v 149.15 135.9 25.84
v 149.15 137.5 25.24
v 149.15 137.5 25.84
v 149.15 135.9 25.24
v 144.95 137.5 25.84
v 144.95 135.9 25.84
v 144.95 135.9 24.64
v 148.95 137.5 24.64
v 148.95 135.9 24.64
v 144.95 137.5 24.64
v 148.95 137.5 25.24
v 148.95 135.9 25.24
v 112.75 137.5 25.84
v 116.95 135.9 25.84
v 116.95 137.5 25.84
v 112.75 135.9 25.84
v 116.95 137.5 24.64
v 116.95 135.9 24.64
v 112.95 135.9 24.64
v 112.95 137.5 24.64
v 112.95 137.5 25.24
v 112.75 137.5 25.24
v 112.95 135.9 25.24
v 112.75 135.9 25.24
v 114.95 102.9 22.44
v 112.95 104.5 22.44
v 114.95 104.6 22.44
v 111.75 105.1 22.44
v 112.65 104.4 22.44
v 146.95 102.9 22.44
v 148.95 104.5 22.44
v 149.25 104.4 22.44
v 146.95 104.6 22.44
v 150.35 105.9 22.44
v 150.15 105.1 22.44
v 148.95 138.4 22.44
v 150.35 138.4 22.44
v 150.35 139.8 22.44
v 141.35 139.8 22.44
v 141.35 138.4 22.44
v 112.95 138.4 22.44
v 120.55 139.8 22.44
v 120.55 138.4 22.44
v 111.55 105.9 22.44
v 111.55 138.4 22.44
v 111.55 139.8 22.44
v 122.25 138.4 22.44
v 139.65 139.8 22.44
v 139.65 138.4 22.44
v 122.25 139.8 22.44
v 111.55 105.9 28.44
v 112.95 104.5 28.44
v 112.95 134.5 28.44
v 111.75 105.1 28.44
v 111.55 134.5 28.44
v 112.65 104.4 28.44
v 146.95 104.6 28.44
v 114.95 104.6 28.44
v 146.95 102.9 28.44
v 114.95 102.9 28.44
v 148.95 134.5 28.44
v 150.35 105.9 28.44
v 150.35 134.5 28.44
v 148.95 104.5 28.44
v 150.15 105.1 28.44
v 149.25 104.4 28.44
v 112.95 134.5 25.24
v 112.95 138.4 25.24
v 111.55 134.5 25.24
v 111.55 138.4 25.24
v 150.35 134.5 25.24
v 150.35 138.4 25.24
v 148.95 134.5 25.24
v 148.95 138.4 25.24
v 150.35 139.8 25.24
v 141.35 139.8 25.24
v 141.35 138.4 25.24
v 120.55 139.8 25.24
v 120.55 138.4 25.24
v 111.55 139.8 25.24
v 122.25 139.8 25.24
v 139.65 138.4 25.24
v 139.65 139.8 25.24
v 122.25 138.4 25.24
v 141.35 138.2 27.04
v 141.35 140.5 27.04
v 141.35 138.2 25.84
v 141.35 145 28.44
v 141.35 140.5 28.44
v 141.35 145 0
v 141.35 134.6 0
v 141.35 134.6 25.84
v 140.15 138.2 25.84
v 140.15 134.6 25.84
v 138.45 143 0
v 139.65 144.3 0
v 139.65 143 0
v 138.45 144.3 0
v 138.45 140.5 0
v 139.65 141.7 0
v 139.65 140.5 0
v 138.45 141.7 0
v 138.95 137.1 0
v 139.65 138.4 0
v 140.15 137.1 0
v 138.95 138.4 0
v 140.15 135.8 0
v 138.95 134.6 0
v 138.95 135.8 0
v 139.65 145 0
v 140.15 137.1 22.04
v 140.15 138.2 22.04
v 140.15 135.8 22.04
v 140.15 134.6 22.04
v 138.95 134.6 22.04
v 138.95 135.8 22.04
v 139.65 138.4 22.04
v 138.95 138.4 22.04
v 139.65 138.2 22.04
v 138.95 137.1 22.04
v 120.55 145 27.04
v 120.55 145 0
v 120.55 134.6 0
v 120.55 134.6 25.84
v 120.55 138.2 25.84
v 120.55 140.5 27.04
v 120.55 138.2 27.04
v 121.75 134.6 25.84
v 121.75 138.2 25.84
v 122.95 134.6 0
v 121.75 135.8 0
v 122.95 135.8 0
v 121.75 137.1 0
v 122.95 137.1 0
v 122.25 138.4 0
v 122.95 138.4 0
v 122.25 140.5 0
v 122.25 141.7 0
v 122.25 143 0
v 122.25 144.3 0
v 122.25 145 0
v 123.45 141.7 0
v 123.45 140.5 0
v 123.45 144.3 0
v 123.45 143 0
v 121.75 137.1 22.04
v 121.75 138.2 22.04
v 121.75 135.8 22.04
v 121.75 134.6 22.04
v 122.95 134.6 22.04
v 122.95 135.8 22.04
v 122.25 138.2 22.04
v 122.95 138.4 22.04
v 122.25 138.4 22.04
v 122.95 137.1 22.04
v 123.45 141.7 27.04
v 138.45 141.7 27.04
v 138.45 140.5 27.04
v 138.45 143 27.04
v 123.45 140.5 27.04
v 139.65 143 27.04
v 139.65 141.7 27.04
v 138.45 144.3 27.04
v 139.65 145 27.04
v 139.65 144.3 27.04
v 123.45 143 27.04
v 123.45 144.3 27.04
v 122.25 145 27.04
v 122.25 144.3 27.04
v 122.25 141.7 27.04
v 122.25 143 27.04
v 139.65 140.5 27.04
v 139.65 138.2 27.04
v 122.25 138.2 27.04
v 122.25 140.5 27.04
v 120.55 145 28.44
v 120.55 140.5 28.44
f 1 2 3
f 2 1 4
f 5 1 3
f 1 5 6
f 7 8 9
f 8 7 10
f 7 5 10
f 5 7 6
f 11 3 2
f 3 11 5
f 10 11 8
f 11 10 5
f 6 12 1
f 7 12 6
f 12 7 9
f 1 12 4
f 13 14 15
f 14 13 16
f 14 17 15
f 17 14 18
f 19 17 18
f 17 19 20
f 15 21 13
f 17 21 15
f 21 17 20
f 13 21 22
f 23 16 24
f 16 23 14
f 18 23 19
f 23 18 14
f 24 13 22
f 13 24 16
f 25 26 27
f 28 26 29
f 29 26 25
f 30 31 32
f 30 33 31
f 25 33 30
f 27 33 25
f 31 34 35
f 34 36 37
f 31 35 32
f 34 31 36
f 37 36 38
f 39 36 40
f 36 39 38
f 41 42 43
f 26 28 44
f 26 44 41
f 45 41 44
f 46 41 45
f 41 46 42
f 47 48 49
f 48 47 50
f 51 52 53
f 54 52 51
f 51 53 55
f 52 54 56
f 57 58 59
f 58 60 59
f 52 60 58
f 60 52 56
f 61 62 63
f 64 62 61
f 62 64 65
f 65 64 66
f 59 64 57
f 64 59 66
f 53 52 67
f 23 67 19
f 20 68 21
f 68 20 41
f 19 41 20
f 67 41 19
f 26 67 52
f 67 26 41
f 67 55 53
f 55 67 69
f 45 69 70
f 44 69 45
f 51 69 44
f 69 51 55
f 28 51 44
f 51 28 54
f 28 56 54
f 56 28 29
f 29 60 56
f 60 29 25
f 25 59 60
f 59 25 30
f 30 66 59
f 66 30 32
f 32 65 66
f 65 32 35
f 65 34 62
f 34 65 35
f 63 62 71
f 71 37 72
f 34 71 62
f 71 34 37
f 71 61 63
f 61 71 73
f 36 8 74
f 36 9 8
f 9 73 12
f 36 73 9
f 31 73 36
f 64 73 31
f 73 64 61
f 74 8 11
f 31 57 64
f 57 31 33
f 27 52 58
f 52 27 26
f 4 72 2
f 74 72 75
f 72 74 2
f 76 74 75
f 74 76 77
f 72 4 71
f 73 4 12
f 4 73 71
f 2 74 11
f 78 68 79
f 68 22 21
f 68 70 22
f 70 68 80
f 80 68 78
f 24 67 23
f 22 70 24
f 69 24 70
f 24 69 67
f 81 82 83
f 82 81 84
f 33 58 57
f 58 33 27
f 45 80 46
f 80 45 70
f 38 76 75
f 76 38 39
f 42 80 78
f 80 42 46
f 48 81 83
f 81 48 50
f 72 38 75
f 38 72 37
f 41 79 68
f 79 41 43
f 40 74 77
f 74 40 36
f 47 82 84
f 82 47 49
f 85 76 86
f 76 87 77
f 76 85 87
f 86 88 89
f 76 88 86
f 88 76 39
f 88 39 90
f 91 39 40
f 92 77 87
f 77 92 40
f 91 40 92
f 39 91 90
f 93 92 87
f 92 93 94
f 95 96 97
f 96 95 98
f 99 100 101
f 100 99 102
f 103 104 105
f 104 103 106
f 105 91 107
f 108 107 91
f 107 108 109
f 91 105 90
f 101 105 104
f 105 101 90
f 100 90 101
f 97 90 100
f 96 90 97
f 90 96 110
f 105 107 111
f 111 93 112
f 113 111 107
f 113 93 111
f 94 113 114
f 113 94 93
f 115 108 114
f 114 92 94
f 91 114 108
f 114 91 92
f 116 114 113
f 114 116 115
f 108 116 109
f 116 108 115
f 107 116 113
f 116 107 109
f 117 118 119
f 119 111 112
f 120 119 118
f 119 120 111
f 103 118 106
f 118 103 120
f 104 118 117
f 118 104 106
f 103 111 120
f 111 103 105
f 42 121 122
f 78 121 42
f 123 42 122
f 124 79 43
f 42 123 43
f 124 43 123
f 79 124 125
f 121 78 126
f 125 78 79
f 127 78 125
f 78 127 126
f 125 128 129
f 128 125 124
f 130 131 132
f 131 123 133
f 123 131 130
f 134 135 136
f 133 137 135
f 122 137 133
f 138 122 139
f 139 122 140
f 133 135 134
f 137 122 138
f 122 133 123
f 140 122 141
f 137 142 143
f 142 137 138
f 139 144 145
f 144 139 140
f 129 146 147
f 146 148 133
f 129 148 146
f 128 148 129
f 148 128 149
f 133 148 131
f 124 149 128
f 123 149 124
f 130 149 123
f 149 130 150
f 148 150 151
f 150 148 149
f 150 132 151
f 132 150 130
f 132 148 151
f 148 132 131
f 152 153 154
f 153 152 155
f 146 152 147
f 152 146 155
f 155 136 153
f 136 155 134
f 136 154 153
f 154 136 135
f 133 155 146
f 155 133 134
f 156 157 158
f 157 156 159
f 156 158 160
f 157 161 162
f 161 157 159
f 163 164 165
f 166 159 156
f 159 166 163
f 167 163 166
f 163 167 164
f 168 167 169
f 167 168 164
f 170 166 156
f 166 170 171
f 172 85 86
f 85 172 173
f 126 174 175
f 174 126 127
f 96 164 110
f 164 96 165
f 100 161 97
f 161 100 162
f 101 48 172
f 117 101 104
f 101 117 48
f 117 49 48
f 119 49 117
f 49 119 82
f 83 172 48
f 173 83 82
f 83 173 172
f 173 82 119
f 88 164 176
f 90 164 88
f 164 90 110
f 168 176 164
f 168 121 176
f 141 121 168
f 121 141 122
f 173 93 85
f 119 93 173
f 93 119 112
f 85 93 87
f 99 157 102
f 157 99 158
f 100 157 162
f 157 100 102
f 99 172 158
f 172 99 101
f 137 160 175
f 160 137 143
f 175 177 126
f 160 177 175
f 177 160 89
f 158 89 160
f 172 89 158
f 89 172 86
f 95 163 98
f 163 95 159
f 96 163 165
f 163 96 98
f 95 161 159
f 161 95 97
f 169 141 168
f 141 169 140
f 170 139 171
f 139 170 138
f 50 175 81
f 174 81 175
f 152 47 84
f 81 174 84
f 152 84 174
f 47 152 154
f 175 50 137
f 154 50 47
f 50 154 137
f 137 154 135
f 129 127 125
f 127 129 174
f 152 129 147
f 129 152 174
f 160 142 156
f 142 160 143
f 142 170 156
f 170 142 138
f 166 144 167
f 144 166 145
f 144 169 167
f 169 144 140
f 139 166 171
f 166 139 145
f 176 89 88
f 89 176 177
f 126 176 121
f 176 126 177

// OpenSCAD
// Deck Buddy SIMPLE INSERT (Elephant style) - TEST. Body frame: x centre 130.95, y = 87.5 + height from table, z = 40.64 - depth from front (z=0 = back opening).
// view = "insert" | "asm" | "clash" | "print"
view = "insert";
BODY = "../reference/original/obj_7_corp+face.stl_1.stl";
XC = 130.95; Y0 = 87.5; ZF = 40.64; e = 0.01;
module blk(x0,x1,h0,h1,d0,d1) translate([XC+x0, Y0+h0, ZF-d1]) cube([x1-x0, h1-h0, d1-d0]);
module mir(f=[1,0,0]) { children(); translate([2*XC,0,0]) mirror([1,0,0]) translate([-0,0,0]) children(); }
module sym() { children(); translate([XC,0,0]) mirror([1,0,0]) translate([-XC,0,0]) children(); }   // mirror about x = XC
// ---- OLED bay (plain, open top and back): PCB 35.4 x 33.5 x 1.2 at d 13.5..14.7, h 17.1..50.6 ----
module ext(d0,d1) translate([XC,Y0,ZF-d1]) linear_extrude(d1-d0) children();
module r2(x0,x1,h0,h1) translate([x0,h0]) square([x1-x0,h1-h0]);
module bay() {
  // lower part follows the bowl of the body (free half width only 16.4 at h15, 18.4 at h17): bottom bar + web, side walls from h18.4
  ext(12.2,18.2) for (s=[1,-1]) scale([s,1]) {
     polygon([[0,15.4],[16,15.4],[18.3,16.9],[19.2,17.6],[19.4,18.4],[18.0,18.4],[18.0,17.0],[16,17.1],[0,17.1]]);
     r2(18.0,19.4,18.4,47.0);
  }
  ext(15.4,18.2) for (s=[1,-1]) scale([s,1]) r2(18.0,19.4,47.0,52.3);   // upper side walls start behind the body bump (d 13-15, h 49)
  ext(12.2,18.2) r2(-16.0,16.0,15.4,17.1);
  ext(15.4,18.2) r2(-19.4,19.4,50.9,52.3);                              // top wall behind the PCB path: ties the bay to the rails (PCB drops in from the top at d 13.5-14.7)                              // bottom bar (PCB rests on it)
  sym() blk(14.0,18.2, 48.4,50.0, 14.8,16.0);                           // two snap catches behind the PCB top corners
}
// ---- ESP32 rails: board 18 x 22 at h 48.3..49.3, d 18.6..40.6 ----
module esp_rails() sym() {
  blk(9.2,10.4, 47.1,51.0, 14.8,40.64);                  // guide wall 1.2
  blk(8.0,9.2,  47.1,48.3, 18.6,40.64);                  // shelf under the board edge
  blk(8.0,9.2,  49.6,50.9, 18.6,40.64);                  // lip over the board edge (0.3 clearance)
}
// ---- TP4056 rails: board 17 x 27 at h 54.2..55.2, d 13.6..40.6, front stop 2 ----
module tp_rails() sym() {
  blk(8.7,10.4, 50.7,57.5, 13.6,40.64);                  // guide wall (joins the bay top)
  blk(7.5,8.7,  53.0,54.2, 13.6,40.64);                  // shelf
  blk(7.5,8.7,  55.5,56.8, 13.6,40.64);                  // lip
}
module tp_stop() blk(-10.4,10.4, 53.0,57.5, 12.2,13.6);   // front stop in FRONT of the PCB top edge (PCB drops in from the top)
module insert() { bay(); esp_rails(); tp_rails(); tp_stop(); }
module board(w,l,h0,d0) blk(-w/2,w/2,h0,h0+1,d0,d0+l);
module boards() { color("green") board(17,27,54.2,13.6); color("blue") board(18,22,48.3,18.6); color("white") blk(-17.7,17.7,17.1,50.6,13.5,14.7); }
if (view=="insert") insert();
if (view=="asm") { color("lightsteelblue",0.35) import(BODY,convexity=10); color("orange") insert(); boards(); }
if (view=="clash") intersection() { import(BODY,convexity=10); insert(); }
if (view=="clash_boards") intersection() { insert(); boards(); }
if (view=="print") translate([0,-Y0-15.4,28.44]) rotate([0,180,0]) translate([-XC,0,-0]) insert();   // front face (d 12.2) on the bed, rails grow upward
if (view=="clash_tp")  intersection() { insert(); board(17,27,54.2,13.6); }
if (view=="clash_esp") intersection() { insert(); board(18,22,48.3,18.6); }
if (view=="clash_pcb") intersection() { insert(); blk(-17.7,17.7,17.1,50.6,13.5,14.7); }
